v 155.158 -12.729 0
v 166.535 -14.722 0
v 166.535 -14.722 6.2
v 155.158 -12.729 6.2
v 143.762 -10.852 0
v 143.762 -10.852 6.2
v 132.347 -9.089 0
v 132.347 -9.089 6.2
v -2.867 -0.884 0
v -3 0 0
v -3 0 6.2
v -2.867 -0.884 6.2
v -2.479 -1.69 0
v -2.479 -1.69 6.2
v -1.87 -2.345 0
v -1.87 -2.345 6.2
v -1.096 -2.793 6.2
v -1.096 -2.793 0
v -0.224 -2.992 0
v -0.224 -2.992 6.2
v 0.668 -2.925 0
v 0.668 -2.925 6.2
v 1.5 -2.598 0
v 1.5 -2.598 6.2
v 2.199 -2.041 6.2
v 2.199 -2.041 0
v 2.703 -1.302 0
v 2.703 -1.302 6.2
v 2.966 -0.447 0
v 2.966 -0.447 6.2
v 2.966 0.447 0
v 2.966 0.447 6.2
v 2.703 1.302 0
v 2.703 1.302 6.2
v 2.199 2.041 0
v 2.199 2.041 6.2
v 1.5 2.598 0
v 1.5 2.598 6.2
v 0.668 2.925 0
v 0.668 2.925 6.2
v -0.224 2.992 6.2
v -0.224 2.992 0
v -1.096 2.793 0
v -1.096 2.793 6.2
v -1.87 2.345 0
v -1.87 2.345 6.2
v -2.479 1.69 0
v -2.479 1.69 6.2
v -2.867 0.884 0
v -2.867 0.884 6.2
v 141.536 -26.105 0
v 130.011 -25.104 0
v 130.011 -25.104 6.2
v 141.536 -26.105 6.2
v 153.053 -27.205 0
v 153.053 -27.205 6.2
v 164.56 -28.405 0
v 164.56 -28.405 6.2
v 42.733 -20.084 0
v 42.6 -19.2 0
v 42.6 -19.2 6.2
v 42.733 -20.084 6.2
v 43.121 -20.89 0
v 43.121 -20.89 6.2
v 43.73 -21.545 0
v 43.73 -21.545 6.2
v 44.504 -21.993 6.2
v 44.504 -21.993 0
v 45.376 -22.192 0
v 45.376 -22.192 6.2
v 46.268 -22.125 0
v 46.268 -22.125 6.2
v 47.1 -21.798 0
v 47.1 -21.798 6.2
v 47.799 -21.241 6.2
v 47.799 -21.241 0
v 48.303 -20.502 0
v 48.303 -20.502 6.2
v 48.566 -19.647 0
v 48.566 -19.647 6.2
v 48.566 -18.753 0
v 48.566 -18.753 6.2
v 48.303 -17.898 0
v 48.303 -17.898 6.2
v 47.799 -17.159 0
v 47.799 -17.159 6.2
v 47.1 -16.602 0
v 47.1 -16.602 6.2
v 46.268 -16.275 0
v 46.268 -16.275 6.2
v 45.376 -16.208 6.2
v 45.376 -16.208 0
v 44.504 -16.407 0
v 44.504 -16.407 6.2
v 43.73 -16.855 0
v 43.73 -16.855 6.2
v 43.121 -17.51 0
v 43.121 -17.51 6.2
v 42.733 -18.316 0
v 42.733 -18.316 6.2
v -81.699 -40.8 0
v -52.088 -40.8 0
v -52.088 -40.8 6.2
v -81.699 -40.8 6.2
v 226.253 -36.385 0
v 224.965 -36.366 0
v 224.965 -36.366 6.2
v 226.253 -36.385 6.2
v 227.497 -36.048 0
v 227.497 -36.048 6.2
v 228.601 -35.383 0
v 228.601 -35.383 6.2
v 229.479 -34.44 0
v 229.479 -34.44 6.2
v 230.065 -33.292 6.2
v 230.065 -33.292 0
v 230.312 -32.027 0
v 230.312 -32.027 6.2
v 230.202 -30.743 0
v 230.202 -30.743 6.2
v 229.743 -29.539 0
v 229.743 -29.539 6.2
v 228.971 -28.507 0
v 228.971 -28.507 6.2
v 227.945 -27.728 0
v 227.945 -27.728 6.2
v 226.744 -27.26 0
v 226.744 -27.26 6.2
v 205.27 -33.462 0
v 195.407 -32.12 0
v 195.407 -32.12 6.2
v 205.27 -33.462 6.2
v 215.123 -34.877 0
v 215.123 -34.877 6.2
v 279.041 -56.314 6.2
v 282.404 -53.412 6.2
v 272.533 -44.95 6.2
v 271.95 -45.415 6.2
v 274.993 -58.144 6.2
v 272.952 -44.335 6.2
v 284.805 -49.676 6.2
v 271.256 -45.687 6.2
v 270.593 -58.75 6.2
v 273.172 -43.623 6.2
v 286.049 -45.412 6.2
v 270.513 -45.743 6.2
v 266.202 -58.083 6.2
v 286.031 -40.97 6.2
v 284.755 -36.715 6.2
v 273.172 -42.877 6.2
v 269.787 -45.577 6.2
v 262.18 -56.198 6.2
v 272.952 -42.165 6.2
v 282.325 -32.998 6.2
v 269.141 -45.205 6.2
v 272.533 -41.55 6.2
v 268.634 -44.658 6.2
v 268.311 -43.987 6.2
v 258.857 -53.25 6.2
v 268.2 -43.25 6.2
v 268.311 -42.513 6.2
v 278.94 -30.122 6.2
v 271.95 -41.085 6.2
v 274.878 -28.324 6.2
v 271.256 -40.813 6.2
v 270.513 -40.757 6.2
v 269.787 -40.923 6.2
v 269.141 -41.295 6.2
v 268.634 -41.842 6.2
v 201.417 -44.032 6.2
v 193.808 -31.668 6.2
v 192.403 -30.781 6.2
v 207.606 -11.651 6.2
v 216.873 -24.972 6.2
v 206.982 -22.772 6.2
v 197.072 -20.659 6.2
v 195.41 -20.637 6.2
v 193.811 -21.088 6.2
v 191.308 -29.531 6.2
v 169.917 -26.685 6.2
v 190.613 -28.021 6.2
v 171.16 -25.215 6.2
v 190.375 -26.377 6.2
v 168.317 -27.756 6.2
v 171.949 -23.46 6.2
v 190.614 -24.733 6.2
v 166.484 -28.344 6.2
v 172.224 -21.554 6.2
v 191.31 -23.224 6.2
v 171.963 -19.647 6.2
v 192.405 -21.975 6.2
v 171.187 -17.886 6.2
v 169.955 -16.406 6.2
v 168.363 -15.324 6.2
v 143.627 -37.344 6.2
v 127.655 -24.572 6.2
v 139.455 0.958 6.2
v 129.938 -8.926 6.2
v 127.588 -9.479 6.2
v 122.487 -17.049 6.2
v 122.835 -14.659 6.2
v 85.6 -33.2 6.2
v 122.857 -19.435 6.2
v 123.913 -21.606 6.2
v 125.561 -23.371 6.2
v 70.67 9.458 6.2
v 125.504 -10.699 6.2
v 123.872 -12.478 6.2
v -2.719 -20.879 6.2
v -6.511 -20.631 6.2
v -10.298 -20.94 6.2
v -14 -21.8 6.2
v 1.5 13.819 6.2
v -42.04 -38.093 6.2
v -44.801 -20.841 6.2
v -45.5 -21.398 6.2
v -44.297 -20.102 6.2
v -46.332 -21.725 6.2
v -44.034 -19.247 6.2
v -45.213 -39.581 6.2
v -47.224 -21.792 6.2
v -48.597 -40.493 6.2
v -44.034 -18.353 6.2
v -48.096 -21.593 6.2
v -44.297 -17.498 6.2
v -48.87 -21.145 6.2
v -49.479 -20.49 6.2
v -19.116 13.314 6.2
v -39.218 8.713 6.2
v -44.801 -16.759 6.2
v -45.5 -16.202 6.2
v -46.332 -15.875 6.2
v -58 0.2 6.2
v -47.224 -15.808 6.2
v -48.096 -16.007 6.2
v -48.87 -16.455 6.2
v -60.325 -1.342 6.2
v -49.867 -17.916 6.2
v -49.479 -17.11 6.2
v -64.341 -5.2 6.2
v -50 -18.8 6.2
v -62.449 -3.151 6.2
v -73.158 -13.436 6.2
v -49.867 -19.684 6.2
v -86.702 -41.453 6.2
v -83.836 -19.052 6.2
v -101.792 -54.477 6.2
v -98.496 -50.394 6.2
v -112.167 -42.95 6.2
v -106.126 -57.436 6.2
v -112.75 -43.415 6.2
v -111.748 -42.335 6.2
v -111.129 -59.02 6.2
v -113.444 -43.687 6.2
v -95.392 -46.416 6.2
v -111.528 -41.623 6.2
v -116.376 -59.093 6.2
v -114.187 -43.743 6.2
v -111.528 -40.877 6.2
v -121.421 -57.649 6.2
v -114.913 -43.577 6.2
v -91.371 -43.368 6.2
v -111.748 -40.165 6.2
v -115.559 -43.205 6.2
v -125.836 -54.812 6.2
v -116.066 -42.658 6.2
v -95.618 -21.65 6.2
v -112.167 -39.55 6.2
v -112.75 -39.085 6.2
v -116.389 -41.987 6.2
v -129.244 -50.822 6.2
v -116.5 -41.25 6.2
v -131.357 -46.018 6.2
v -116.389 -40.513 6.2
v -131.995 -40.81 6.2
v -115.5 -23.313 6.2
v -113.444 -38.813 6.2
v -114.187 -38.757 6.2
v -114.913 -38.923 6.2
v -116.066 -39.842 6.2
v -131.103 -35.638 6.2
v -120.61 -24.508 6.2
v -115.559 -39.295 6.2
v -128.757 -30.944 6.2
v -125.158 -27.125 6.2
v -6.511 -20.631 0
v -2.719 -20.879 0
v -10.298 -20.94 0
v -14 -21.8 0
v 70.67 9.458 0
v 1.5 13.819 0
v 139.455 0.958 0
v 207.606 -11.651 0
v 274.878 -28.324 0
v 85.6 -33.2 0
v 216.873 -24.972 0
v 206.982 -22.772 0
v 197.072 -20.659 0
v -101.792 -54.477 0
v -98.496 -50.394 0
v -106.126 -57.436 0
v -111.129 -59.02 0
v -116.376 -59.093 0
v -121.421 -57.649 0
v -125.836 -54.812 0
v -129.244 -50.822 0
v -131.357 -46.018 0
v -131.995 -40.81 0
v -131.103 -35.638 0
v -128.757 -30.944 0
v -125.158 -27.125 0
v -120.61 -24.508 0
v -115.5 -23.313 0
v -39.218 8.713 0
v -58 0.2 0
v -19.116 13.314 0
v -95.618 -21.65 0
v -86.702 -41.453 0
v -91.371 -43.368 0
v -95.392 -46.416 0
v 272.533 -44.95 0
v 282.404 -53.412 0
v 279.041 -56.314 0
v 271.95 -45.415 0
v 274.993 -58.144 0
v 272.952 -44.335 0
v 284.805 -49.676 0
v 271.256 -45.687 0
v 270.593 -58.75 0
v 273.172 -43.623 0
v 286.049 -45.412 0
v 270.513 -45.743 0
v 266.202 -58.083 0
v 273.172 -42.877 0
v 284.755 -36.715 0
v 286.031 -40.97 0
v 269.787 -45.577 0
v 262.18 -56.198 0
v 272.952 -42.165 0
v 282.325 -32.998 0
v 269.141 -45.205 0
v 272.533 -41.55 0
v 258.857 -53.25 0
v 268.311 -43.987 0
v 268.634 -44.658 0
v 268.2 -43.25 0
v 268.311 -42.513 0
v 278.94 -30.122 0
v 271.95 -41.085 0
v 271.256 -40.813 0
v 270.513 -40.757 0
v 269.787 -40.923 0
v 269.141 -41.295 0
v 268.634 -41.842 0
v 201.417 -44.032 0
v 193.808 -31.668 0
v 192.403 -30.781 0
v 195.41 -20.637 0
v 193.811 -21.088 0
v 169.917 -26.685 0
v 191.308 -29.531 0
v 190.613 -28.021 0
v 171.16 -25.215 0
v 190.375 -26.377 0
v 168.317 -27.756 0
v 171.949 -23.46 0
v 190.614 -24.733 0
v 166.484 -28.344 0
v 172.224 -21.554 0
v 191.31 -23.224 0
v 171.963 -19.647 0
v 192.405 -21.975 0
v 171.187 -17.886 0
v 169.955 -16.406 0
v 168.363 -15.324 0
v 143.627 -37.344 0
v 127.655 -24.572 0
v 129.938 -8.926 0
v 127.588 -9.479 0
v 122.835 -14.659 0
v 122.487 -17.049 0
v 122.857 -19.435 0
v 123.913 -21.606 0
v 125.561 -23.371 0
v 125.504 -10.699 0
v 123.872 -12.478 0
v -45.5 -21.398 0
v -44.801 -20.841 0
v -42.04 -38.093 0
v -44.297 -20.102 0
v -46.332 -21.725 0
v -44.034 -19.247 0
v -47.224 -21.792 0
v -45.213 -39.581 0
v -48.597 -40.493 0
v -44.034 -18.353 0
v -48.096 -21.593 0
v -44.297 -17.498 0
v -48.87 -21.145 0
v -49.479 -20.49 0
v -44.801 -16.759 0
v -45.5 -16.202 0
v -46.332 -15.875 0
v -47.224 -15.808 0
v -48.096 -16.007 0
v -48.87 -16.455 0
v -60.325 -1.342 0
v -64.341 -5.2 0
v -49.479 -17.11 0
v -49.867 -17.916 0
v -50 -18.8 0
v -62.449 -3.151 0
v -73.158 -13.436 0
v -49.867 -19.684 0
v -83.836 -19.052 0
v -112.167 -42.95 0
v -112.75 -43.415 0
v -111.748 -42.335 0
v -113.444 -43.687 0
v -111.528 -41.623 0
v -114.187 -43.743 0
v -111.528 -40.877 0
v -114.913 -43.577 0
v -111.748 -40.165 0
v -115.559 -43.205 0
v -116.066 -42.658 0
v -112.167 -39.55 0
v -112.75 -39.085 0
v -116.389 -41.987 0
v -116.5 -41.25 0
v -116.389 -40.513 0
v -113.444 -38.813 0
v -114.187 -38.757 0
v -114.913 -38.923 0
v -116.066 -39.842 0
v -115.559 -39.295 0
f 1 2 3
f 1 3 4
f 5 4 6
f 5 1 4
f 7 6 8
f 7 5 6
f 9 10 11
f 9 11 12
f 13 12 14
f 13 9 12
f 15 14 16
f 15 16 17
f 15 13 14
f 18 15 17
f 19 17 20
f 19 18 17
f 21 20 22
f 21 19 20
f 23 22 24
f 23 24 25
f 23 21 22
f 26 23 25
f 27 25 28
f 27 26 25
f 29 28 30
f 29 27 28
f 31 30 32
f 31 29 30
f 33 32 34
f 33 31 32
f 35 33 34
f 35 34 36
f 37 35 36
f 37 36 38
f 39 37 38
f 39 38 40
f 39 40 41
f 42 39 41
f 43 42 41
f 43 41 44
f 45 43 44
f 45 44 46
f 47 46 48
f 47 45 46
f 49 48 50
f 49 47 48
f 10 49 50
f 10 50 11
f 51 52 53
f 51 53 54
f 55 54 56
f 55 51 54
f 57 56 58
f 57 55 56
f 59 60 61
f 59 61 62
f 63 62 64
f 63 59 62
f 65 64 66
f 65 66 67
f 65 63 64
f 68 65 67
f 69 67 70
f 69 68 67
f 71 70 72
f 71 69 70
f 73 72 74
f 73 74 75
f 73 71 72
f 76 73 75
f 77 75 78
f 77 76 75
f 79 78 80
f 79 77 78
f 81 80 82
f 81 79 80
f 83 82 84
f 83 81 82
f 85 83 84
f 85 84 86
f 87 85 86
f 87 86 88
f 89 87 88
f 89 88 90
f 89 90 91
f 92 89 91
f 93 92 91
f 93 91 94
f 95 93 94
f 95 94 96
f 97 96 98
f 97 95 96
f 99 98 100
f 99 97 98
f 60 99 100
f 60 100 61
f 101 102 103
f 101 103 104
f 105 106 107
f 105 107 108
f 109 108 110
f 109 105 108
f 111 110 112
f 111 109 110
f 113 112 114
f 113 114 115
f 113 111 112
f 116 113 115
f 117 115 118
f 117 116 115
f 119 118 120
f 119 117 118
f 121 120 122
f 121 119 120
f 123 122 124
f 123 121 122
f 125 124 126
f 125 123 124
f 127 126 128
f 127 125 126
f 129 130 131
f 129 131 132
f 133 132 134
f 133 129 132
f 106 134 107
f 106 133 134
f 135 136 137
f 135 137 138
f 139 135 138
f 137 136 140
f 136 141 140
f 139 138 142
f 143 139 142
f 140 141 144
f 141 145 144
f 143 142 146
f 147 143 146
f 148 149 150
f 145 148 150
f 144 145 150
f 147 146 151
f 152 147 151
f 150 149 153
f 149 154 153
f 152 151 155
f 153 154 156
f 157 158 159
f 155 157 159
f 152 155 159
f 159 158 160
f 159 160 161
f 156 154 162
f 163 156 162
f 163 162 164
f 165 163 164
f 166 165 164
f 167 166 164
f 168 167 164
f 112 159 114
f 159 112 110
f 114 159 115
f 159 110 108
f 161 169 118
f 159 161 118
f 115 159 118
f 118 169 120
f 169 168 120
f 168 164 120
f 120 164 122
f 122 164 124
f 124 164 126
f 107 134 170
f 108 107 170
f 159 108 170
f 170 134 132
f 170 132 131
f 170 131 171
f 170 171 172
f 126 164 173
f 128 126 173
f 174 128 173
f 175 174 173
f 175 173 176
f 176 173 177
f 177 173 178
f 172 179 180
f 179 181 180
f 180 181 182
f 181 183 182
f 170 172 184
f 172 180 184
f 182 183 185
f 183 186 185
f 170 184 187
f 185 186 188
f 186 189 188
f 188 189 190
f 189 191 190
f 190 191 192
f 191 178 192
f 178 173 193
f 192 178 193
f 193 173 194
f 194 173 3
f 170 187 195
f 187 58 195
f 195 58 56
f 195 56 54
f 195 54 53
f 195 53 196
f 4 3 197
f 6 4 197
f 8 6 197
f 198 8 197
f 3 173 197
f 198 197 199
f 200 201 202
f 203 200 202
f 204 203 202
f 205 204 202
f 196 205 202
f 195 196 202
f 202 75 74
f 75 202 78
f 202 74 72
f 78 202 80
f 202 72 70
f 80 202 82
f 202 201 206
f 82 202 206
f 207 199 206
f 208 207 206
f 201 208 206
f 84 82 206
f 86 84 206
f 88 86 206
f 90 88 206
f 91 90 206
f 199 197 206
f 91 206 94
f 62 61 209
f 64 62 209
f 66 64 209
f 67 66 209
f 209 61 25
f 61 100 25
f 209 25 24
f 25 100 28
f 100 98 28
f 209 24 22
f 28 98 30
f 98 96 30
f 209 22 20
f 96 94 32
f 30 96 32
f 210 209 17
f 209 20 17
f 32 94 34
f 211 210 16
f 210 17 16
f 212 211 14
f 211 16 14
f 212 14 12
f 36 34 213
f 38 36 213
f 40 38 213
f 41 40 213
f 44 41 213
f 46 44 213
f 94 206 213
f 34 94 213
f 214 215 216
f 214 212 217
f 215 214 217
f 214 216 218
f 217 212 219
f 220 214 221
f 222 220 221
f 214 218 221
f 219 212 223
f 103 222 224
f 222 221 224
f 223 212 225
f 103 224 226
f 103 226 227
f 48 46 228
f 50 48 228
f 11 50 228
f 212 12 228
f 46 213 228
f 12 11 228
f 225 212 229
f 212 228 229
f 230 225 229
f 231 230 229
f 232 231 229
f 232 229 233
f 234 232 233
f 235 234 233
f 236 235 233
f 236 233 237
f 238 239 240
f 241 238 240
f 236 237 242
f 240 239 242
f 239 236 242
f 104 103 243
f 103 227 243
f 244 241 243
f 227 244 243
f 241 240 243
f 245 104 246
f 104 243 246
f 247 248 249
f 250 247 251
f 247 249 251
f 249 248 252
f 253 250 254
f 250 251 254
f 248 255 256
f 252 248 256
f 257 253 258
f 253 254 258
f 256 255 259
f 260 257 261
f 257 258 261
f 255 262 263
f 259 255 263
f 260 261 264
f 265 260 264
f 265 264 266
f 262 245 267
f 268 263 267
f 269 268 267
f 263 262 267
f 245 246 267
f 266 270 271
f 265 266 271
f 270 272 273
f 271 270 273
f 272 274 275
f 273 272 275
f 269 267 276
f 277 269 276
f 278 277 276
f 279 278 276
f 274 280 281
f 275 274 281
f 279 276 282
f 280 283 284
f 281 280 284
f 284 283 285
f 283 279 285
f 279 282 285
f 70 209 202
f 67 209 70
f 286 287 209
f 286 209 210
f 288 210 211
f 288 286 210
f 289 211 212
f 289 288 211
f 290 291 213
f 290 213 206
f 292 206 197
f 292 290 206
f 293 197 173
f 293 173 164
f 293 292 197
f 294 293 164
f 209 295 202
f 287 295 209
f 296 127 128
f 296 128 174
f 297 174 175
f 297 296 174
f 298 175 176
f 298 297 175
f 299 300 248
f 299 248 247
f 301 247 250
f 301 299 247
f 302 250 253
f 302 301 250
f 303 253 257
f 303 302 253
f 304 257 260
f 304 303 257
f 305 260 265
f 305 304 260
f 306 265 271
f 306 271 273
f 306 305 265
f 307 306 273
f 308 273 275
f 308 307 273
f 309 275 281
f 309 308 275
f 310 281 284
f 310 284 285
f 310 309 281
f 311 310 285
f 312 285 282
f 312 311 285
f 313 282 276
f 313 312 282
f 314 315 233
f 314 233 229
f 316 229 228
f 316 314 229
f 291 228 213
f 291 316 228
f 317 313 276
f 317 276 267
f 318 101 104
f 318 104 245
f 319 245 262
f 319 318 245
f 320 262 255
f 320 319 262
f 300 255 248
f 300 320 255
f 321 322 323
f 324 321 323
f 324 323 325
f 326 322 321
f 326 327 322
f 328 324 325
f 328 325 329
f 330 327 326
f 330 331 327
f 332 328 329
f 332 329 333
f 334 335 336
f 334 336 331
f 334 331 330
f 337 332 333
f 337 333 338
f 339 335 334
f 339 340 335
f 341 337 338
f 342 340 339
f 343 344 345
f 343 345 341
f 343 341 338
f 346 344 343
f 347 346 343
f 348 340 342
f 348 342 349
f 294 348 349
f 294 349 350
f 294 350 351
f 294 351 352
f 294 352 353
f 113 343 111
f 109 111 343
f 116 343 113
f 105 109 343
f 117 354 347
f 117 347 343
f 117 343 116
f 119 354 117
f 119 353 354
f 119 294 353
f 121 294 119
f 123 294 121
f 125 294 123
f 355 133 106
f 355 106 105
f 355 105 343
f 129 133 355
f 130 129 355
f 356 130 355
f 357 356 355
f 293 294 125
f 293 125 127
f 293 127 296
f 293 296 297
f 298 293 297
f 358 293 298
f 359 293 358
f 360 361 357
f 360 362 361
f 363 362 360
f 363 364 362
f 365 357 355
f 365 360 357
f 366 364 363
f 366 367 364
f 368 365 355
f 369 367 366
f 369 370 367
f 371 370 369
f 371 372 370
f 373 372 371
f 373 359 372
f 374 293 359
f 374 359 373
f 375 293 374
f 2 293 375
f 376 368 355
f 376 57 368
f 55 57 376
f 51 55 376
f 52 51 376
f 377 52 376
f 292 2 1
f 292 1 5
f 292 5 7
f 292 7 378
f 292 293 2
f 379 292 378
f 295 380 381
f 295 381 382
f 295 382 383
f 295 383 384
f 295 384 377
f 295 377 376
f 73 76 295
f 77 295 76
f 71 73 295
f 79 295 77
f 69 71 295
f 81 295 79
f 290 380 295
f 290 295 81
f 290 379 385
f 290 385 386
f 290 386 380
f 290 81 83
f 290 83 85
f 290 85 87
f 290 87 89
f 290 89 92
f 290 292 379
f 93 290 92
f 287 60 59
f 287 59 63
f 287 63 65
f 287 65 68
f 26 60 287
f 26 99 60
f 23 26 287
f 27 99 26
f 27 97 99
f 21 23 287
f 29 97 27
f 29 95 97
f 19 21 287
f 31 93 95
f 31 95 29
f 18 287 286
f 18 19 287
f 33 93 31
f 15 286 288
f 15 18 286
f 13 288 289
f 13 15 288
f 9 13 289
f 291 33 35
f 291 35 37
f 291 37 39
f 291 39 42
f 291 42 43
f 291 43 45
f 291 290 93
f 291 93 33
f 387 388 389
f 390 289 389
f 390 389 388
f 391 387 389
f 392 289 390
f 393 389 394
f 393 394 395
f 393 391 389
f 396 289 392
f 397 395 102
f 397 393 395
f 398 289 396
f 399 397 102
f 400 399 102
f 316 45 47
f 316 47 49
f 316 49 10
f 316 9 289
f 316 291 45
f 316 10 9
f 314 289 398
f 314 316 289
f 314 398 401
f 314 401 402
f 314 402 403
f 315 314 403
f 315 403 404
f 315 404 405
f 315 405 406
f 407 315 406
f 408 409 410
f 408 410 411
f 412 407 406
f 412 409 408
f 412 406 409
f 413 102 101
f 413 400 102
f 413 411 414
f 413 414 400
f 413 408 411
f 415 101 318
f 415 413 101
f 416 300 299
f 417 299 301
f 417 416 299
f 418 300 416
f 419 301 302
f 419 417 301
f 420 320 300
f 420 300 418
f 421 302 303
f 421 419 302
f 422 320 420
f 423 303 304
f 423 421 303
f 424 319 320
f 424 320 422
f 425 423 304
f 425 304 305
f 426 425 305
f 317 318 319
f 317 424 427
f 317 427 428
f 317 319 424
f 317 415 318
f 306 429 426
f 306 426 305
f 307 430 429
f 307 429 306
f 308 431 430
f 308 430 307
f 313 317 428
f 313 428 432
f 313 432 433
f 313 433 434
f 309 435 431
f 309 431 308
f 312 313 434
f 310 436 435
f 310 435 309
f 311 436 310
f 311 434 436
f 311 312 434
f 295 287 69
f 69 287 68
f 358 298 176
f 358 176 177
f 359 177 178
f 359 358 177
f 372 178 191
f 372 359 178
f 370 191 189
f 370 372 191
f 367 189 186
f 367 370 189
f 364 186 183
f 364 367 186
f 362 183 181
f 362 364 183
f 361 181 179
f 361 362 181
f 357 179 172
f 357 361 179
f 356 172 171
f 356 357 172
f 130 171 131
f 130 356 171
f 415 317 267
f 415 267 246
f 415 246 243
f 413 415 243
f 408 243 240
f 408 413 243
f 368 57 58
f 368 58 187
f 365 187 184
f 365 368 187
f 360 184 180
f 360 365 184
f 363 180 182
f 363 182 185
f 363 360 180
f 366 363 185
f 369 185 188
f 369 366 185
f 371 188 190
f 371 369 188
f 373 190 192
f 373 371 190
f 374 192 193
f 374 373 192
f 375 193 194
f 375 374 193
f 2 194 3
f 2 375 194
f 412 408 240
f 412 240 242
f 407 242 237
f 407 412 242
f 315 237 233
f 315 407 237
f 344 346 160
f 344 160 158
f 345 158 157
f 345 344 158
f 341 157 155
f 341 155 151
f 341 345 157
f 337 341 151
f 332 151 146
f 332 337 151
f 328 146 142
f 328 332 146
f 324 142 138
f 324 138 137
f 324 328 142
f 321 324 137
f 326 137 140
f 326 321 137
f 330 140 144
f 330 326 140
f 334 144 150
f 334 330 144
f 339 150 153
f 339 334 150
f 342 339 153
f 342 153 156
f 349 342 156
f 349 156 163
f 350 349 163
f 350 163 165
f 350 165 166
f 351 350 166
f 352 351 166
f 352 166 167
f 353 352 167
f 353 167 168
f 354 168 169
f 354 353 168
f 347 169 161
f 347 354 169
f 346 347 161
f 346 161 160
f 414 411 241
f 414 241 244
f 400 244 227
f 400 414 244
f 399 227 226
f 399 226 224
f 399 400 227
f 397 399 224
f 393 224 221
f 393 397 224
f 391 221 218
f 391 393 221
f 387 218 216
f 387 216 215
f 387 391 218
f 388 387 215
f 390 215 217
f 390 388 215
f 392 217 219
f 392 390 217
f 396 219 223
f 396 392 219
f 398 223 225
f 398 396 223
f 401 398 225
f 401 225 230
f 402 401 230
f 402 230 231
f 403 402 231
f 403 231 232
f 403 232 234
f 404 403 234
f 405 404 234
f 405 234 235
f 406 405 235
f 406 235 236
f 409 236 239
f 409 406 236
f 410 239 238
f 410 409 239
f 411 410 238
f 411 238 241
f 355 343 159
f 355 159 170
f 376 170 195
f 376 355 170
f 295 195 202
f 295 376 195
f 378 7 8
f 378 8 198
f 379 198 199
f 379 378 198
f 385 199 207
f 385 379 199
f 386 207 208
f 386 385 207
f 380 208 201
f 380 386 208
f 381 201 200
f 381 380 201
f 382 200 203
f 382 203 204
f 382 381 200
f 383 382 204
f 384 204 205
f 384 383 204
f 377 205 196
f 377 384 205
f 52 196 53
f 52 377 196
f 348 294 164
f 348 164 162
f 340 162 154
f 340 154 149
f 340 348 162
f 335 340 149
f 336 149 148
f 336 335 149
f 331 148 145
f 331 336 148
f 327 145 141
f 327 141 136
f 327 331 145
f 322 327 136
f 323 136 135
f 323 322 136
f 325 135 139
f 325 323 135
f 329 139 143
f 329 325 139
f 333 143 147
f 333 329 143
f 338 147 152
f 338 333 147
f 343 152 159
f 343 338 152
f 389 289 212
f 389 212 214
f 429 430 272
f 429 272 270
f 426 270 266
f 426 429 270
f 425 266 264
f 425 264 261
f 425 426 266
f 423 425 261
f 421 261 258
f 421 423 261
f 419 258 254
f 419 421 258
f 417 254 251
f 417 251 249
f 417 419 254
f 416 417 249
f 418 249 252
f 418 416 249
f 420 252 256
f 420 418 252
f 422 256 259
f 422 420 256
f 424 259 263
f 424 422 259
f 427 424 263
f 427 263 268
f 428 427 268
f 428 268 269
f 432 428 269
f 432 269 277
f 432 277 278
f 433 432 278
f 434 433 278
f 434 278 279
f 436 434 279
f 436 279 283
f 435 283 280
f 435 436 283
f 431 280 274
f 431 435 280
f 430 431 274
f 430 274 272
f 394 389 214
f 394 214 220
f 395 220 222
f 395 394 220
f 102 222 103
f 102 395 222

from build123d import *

# Parameters (mm, degrees)
SKETCH1_R           = 2.5
SKETCH1_R_2         = 3
BOSS_EXTRUDE1_DEPTH = 6.2


with BuildPart() as part:
    # Sketch1 → Boss-Extrude1 (new body)
    with BuildSketch(Plane.XY):
        with BuildLine():
            Line((85.6, -33.2), (-2.718519223, -20.878508118))
            ThreePointArc((-2.718519223, -20.878508118), (-8.41017463, -20.715920511), (-14, -21.8))
            Line((-14, -21.8), (-42.039824529, -38.092696265))
            ThreePointArc((-42.039824529, -38.092696265), (-46.884666341, -40.111316958), (-52.087842039, -40.8))
            Line((-52.087842039, -40.8), (-81.699109919, -40.8))
            ThreePointArc((-81.699109919, -40.8), (-91.370795398, -43.36753119), (-98.495572761, -50.394))
            ThreePointArc((-98.495572761, -50.394), (-129.24406218, -50.82175889), (-115.5, -23.312608885))
            Line((-115.5, -23.312608885), (-95.618089435, -21.65))
            ThreePointArc((-95.618089435, -21.65), (-78.309182519, -16.601252711), (-64.341378668, -5.2))
            ThreePointArc((-64.341378668, -5.2), (-61.413749232, -2.21456762), (-58, 0.2))
            ThreePointArc((-58, 0.2), (-29.282001226, 11.518177334), (1.5, 13.818827736))
            ThreePointArc((1.5, 13.818827736), (139.454874424, 0.958251967), (274.87829908, -28.323787594))
            ThreePointArc((274.87829908, -28.323787594), (283.738974288, -51.630641354), (258.857280718, -53.25))
            ThreePointArc((258.857280718, -53.25), (172.558903288, -40.371111866), (85.6, -33.2))
        make_face()
        with Locations(Location((-114, -41.25, 0), (0, 0, 180))):
            Circle(SKETCH1_R, mode=Mode.SUBTRACT)
        with Locations(Location((270.7, -43.25, 0), (0, 0, 180))):
            Circle(SKETCH1_R, mode=Mode.SUBTRACT)
        with Locations(Location((-47, -18.8, 0), (0, 0, 180))):
            Circle(SKETCH1_R_2, mode=Mode.SUBTRACT)
        with Locations(Location((45.6, -19.2, 0), (0, 0, 180))):
            Circle(SKETCH1_R_2, mode=Mode.SUBTRACT)
        with Locations(Location((0, 0, 0), (0, 0, 180))):
            Circle(SKETCH1_R_2, mode=Mode.SUBTRACT)
        with BuildLine():
            ThreePointArc((226.744224082, -27.259797753), (211.929816899, -23.860779344), (197.071572094, -20.658819377))
            ThreePointArc((197.071572094, -20.658819377), (190.434794526, -25.546132018), (195.40651845, -32.119913468))
            ThreePointArc((195.40651845, -32.119913468), (210.197393834, -34.160215491), (224.964543777, -36.365688118))
            ThreePointArc((224.964543777, -36.365688118), (230.232403999, -32.668395241), (226.744224082, -27.259797753))
        make_face(mode=Mode.SUBTRACT)
        with BuildLine():
            ThreePointArc((132.347185699, -9.089339403), (122.571709195, -15.840894216), (130.010518711, -25.104130489))
            ThreePointArc((130.010518711, -25.104130489), (147.296090717, -26.642266435), (164.560225388, -28.404797523))
            ThreePointArc((164.560225388, -28.404797523), (172.152990765, -22.51669502), (166.534944909, -14.721991823))
            ThreePointArc((166.534944909, -14.721991823), (149.462384392, -11.776267989), (132.347185699, -9.089339403))
        make_face(mode=Mode.SUBTRACT)
    extrude(amount=BOSS_EXTRUDE1_DEPTH)


solid = part.part
